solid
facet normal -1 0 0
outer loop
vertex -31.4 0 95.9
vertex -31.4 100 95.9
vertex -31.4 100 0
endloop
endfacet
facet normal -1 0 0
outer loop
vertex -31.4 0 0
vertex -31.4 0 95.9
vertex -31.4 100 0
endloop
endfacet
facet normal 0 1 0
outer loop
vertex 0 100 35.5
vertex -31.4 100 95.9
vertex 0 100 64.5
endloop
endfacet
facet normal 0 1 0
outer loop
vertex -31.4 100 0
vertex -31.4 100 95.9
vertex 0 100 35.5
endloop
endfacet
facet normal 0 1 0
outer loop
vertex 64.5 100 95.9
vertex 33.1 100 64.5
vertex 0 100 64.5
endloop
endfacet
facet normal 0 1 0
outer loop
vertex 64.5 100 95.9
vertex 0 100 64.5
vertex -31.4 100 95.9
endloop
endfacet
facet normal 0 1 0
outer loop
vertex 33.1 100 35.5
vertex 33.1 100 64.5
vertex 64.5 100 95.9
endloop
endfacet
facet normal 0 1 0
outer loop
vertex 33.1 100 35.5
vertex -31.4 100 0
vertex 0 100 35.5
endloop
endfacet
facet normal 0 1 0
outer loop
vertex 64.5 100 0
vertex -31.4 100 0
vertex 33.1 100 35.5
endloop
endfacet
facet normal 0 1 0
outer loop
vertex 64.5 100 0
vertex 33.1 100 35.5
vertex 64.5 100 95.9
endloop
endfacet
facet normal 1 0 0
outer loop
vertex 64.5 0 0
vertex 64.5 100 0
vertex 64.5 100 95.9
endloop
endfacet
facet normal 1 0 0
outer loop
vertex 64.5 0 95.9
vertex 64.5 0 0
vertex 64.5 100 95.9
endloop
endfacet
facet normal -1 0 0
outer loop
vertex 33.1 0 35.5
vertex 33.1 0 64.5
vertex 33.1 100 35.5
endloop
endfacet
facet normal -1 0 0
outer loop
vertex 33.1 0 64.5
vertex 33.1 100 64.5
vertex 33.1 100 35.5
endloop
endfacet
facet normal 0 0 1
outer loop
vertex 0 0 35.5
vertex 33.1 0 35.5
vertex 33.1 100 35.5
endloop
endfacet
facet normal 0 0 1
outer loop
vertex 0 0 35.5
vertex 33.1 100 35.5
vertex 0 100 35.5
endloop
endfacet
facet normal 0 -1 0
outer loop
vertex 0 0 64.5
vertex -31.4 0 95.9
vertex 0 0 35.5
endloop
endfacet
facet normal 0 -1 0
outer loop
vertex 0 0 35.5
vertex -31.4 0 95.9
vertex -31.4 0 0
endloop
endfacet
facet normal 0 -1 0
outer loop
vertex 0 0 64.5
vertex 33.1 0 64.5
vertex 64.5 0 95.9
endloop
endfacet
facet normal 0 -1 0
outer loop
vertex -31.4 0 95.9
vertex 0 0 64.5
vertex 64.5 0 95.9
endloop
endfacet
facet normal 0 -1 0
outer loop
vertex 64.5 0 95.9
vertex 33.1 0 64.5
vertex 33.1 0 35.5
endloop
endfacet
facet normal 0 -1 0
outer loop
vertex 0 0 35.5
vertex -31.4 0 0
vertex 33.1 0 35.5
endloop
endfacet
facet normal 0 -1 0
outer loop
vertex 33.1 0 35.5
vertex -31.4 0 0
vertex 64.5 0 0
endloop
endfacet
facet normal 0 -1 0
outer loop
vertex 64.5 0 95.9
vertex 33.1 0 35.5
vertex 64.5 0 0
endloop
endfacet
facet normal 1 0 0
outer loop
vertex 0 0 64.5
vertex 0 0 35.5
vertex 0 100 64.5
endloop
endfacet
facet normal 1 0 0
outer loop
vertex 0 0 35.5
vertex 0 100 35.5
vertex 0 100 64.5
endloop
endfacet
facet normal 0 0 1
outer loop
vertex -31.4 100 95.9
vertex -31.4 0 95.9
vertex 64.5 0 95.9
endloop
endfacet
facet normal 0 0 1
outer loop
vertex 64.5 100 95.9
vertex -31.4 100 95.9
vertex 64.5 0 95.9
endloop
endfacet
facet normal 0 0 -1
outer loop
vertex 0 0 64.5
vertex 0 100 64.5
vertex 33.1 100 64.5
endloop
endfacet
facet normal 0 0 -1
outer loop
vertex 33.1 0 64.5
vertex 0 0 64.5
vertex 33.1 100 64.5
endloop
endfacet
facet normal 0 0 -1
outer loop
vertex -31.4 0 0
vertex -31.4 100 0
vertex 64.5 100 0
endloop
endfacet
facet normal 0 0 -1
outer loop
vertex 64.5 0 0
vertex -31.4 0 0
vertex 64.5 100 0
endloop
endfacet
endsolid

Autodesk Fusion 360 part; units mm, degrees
sketch "Sketch2" plane through (0, 0, 0) normal (0, 1, 0) x (1, 0, 0)
  line L0 (0, 0) -> (64.5, 0)
  line L1 (64.5, 0) -> (64.5, -35.5)
  line L2 (64.5, -35.5) -> (0, -35.5)
  line L3 (0, -35.5) -> (0, 0)
  dimension "d5" = 64.5
  dimension "d6" = 35.5
extrude "Extrude2" add sketch "Sketch2" along normal blind 100 makes body 1
sketch "Sketch3" plane through (0, 0, 0) normal (-1, 0, 0) x (0, 0, 1)
  line L0 (0, 0) -> (35.5, 0)
  line L1 (35.5, 0) -> (35.5, 100)
  line L2 (35.5, 100) -> (0, 100)
  line L3 (0, 100) -> (0, 0)
  line L4 (0, 100) -> (64.5, 100)
  line L5 (64.5, 100) -> (64.5, 0)
  line L6 (64.5, 0) -> (0, 0)
  line L7 (0, 0) -> (0, 100)
  dimension "d9" = 64.5
  dimension "d10" = 100
extrude "Extrude3" add sketch "Sketch3" along normal blind 31.4 separate body contours L1 L4 L5 L6 makes body 2
extrude "Extrude4" add 1 faces at (0, 66.6667, 23.6667) along direction (-1, 0, 0) blind 31.4 on bodies 1 bodies 1 2
sketch "Sketch4" plane through (0, 0, 64.5) normal (0, 0, 1) x (1, 0, 0)
  line L0 (0, 0) -> (0, 100)
  line L1 (0, 100) -> (-31.4, 100)
  line L2 (-31.4, 100) -> (-31.4, 0)
  line L3 (-31.4, 0) -> (0, 0)
  line L4 (-31.4, 100) -> (33.1, 100)
  line L5 (33.1, 100) -> (33.1, 0)
  line L6 (33.1, 0) -> (-31.4, 0)
  line L7 (-31.4, 0) -> (-31.4, 100)
  dimension "d15" = 64.5
  dimension "d16" = 100
extrude "Extrude5" add sketch "Sketch4" along normal blind 31.4 bodies 1
sketch "Sketch5" plane through (33.1, 0, 0) normal (1, 0, 0) x (0, 0, -1)
  line L0 (-64.5, 0) -> (-64.5, 100)
  line L1 (-64.5, 100) -> (-95.9, 100)
  line L2 (-95.9, 100) -> (-95.9, 0)
  line L3 (-95.9, 0) -> (-64.5, 0)
  line L4 (-95.9, 100) -> (-31.4, 100)
  line L5 (-31.4, 100) -> (-31.4, 0)
  line L6 (-31.4, 0) -> (-95.9, 0)
  line L7 (-95.9, 0) -> (-95.9, 100)
  dimension "d19" = 64.5
  dimension "d20" = 100
extrude "Extrude6" add sketch "Sketch5" along normal blind 31.4 bodies 1
